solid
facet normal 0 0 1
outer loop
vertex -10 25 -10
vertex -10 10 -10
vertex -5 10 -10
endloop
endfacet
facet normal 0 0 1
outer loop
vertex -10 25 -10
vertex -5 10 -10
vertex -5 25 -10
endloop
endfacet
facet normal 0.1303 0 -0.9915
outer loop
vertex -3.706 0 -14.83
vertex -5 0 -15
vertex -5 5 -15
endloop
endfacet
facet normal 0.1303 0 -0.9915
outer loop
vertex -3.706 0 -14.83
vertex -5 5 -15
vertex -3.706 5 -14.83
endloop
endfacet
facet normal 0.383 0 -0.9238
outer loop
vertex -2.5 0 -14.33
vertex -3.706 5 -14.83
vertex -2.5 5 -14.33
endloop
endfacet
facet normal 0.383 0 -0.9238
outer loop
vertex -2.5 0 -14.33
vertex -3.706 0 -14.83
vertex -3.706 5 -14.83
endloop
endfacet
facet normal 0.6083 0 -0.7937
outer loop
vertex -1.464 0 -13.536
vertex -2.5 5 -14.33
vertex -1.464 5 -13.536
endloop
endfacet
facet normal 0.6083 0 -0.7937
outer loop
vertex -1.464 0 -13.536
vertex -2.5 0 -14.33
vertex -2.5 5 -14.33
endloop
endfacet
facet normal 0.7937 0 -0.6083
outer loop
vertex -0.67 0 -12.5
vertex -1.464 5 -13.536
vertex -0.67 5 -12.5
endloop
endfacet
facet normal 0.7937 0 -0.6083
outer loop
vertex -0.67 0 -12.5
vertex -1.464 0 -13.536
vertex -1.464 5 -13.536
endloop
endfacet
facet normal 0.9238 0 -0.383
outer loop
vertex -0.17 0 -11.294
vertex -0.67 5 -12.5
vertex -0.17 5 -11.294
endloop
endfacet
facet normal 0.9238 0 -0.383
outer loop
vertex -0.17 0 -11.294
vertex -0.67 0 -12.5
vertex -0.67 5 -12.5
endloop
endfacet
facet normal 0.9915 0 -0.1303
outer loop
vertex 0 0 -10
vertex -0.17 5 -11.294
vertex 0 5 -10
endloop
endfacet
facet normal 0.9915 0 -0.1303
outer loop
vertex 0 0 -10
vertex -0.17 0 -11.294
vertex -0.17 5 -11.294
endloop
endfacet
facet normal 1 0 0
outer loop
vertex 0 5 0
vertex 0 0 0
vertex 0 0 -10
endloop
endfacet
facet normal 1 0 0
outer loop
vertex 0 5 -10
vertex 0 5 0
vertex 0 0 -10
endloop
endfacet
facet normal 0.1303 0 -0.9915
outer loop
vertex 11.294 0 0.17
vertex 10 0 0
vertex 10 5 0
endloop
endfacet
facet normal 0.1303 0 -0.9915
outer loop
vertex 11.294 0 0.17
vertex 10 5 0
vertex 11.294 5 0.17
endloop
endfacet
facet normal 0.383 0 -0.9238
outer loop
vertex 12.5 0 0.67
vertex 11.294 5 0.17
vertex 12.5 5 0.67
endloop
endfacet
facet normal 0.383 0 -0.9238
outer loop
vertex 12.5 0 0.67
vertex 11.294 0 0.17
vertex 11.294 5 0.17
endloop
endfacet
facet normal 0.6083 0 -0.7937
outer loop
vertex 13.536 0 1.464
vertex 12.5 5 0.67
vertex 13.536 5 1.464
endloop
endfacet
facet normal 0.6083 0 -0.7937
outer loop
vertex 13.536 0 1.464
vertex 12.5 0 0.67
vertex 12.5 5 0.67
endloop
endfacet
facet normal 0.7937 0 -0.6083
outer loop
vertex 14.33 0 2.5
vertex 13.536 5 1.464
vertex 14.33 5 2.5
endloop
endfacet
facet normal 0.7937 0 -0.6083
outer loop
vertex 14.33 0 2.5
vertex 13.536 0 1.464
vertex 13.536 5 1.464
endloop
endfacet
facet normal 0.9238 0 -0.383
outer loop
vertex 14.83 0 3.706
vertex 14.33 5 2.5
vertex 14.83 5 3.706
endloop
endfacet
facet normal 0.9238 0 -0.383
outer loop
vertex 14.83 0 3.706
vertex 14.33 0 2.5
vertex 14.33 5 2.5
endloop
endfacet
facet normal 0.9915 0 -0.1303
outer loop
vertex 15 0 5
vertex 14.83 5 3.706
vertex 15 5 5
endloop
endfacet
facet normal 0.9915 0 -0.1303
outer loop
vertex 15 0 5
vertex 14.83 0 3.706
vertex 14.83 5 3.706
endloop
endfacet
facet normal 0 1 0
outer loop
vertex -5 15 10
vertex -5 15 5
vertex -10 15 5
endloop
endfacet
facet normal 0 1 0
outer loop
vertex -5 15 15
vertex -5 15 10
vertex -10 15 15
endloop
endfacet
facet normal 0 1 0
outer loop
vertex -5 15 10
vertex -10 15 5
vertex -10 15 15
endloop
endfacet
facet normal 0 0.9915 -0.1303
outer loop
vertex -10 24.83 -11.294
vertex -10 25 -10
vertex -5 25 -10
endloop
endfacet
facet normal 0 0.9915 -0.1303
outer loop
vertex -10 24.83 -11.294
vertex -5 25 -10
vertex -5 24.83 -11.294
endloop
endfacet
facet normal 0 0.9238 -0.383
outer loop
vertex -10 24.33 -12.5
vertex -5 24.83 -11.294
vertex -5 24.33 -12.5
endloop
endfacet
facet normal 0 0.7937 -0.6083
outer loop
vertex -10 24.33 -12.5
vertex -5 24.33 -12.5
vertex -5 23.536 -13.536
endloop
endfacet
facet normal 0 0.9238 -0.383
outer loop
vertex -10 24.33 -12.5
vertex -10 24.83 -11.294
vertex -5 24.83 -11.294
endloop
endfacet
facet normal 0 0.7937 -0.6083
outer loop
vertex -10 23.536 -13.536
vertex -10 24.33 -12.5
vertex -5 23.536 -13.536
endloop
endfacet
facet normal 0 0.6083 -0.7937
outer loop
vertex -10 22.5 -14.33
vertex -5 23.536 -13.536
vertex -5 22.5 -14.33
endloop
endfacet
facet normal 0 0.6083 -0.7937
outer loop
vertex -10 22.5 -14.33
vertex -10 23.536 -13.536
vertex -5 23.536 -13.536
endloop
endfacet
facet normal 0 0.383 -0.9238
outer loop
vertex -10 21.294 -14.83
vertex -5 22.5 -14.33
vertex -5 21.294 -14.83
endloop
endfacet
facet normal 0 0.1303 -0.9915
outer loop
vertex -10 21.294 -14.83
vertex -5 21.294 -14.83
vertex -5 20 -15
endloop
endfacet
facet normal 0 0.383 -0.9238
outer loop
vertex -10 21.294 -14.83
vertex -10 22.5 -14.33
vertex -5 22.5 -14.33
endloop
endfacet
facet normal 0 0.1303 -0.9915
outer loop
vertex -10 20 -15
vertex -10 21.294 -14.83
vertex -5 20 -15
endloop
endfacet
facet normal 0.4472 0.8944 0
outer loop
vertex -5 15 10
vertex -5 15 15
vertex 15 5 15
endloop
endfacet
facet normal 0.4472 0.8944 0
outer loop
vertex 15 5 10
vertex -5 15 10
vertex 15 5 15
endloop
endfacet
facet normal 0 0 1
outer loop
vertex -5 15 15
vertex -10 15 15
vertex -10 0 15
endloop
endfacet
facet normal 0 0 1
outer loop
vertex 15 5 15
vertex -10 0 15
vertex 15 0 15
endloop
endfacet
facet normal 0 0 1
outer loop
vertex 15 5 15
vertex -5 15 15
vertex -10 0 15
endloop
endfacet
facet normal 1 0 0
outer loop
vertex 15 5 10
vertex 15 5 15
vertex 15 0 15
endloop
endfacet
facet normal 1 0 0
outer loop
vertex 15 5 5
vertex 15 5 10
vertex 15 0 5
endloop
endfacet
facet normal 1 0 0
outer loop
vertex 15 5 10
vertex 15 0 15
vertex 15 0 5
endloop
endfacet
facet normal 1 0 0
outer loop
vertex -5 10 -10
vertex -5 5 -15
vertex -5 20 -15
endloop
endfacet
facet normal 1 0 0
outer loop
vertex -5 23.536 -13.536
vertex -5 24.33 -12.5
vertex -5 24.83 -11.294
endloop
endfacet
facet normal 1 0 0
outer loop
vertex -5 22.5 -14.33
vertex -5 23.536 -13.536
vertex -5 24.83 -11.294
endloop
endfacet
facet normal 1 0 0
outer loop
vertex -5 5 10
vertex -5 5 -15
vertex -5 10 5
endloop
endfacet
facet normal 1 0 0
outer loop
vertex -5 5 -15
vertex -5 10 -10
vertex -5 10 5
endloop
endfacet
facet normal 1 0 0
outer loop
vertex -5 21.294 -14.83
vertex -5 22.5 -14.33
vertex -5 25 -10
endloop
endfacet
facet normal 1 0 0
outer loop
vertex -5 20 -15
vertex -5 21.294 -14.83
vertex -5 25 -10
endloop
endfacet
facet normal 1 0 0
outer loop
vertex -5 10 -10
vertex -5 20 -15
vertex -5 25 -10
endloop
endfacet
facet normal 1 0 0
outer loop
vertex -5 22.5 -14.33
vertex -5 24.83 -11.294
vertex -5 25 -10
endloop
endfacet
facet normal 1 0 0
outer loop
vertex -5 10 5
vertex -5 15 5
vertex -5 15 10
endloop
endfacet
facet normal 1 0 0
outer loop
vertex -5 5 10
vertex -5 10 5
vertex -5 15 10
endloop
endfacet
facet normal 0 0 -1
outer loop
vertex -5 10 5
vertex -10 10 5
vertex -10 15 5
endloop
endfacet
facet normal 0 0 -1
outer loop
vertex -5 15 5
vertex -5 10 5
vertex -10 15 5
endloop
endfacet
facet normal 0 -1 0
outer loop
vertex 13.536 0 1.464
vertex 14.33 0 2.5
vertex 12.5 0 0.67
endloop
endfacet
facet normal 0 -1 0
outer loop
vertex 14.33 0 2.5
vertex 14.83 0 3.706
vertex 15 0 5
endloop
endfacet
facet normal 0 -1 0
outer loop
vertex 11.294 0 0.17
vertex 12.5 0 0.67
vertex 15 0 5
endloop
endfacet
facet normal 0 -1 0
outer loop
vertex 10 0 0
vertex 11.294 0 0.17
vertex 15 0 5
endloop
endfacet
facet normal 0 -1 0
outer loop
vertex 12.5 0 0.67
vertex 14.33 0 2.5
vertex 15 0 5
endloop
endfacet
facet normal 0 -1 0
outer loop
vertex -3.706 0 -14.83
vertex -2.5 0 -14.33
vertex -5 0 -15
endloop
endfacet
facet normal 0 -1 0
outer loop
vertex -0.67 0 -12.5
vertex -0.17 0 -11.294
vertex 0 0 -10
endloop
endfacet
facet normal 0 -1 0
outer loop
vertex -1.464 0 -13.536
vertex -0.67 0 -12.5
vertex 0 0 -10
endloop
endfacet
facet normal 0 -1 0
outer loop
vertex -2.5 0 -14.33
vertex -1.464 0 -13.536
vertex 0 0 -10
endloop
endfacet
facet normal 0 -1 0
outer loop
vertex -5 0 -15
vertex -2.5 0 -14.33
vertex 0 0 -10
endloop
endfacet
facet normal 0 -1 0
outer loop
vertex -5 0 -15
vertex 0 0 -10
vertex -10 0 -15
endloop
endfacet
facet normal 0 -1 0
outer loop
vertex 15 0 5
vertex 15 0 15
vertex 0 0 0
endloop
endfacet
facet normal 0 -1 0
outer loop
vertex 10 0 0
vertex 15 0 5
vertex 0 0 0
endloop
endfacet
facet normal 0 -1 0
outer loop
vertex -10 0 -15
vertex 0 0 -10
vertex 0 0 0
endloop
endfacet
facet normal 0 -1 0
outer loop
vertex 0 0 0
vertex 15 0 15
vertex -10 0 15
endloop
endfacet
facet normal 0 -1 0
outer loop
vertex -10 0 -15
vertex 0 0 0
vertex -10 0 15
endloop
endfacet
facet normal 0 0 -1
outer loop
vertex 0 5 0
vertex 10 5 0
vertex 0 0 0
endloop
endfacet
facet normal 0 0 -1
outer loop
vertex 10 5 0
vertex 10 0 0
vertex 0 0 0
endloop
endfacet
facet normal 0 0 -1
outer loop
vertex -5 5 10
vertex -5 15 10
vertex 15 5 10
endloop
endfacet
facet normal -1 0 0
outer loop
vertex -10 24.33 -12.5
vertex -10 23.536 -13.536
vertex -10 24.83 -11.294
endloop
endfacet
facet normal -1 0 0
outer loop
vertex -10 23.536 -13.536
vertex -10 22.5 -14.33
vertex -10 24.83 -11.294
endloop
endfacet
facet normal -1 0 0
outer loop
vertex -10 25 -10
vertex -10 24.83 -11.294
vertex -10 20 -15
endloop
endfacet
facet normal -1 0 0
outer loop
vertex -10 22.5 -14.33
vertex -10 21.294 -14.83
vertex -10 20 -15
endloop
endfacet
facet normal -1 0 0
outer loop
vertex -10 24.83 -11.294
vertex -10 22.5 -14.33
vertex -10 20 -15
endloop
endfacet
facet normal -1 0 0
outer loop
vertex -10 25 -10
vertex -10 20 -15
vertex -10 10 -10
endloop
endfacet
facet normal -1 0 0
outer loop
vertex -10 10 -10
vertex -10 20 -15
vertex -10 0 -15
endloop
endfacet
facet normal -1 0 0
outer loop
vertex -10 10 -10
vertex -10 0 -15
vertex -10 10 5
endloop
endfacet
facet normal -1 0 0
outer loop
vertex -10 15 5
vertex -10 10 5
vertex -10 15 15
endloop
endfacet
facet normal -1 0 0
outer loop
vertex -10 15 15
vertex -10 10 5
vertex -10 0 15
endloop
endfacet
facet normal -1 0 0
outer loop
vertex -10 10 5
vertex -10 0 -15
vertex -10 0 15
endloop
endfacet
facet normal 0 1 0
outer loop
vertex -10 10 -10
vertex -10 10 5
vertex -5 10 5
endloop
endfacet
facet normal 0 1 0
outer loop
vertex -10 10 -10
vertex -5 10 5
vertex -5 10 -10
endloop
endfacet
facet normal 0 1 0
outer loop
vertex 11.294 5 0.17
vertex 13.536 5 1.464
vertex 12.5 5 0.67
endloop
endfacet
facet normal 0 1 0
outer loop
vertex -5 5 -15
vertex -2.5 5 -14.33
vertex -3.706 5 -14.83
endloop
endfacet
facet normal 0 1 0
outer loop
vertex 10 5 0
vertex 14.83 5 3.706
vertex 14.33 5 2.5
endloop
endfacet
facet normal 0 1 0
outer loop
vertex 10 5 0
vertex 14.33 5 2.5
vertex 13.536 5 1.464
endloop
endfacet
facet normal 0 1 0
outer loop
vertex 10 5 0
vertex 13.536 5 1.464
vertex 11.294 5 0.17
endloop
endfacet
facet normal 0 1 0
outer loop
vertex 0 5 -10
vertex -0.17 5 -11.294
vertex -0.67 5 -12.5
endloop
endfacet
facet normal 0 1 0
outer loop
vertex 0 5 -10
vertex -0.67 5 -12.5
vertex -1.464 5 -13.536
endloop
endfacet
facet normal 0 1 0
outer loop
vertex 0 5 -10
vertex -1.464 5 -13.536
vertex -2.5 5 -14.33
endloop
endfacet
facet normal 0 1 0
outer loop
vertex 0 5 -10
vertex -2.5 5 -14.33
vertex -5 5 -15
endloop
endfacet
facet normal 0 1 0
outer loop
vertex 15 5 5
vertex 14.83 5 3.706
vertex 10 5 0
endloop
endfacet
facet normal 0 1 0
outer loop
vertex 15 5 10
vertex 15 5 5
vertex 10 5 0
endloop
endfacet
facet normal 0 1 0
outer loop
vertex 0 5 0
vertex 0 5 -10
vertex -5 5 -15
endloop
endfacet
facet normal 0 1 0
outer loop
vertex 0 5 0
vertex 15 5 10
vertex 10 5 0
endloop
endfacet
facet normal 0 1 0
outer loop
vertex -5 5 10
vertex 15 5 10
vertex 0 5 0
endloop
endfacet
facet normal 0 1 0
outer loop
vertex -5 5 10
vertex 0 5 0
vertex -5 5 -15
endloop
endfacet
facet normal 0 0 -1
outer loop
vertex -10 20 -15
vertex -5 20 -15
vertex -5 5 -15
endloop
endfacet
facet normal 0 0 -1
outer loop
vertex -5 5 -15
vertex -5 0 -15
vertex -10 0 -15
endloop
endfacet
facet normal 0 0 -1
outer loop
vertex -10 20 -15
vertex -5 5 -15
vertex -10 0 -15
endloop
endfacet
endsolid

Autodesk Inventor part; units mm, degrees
ref_plane "YZ Plane" through (0, 0, 0) normal (1, 0, 0) x (0, 1, 0)
ref_plane "XZ Plane" through (0, 0, 0) normal (0, 1, 0) x (-1, 0, 0)
ref_plane "XY Plane" through (0, 0, 0) normal (0, 0, 1) x (1, 0, 0)
sketch "草圖1" plane through (0, 0, 0) normal (0, 1, 0) x (-1, 0, 0)
  line L0 (10, 15) -> (-15, 15)
  line L1 (-15, 15) -> (-15, 5)
  line L2 (-10, 0) -> (0, 0)
  line L3 (10, 0) -> (10, 15)
  line L4 (10, 15) -> (0, 15)
  line L5 (0, 0) -> (0, -10)
  line L6 (5, -15) -> (10, -15)
  line L7 (10, -15) -> (10, 15)
  arc A0 (0, -10) -> (5, -15) centre (5, -10) ccw
  arc A1 (-15, 5) -> (-10, 0) centre (-10, 5) ccw
  point P0 (-15, 0)
  point P1 (0, -15)
  dimension "d0" = 15
  dimension "d1" = 10
  dimension "d2" = 30
  dimension "d3" = 25
  dimension "d4" = 5
extrude "擠出1" add sketch "草圖1" along normal blind 5
sketch "草圖2" plane through (-10, 0, -15) normal (-1, 0, 0) x (0, 0, 1)
  line L0 (30, 0) -> (20, 0) construction
  line L1 (20, 0) -> (20, 5) construction
  line L2 (30, 5) -> (20, 5) construction
  line L3 (30, 0) -> (30, 5) construction
  line L4 (20, 0) -> (15, 0) construction
  line L5 (15, 0) -> (15, 5) construction
  line L6 (20, 5) -> (15, 5) construction
  line L7 (20, 0) -> (20, 5) construction
  line L8 (15, 0) -> (5, 0) construction
  line L9 (5, 0) -> (5, 5) construction
  line L10 (15, 5) -> (5, 5) construction
  line L11 (15, 0) -> (15, 5) construction
  line L12 (5, 0) -> (0, 0) construction
  line L13 (0, 0) -> (0, 5) construction
  line L14 (5, 5) -> (0, 5) construction
  line L15 (5, 0) -> (5, 5) construction
  line L16 (30, 0) -> (30, 5) projected
  line L17 (30, 5) -> (20, 5)
  line L18 (20, 10) -> (20, 15)
  line L19 (20, 15) -> (30, 15)
  line L20 (30, 15) -> (30, 5)
  line L21 (15, 5) -> (5, 5) projected
  line L22 (20, 10) -> (5, 10)
  line L23 (5, 5) -> (20, 5)
  line L24 (0, 5) -> (30, 5) projected
  line L25 (0, 5) -> (5, 5)
  line L26 (5, 10) -> (5, 25)
  line L27 (5, 25) -> (5, 25)
  line L28 (0, 20) -> (0, 5)
  arc A0 (5, 25) -> (0, 20) centre (5, 20) ccw
  point P0 (0, 25)
  dimension "d7" = 5
  dimension "d8" = 10
  dimension "d9" = 10
  dimension "d10" = 5
  dimension "d11" = 20
  dimension "d12" = 5
extrude "擠出2" add sketch "草圖2" against normal blind 5
sketch "草圖3" plane through (-10, 0, 15) normal (0, 0, 1) x (1, 0, 0)
  line L0 (0, 0) -> (25, 0) construction
  line L1 (25, 0) -> (25, 5) construction
  line L2 (5, 5) -> (25, 5) construction
  line L3 (5, 15) -> (5, 5) construction
  line L4 (0, 15) -> (5, 15) construction
  line L5 (0, 0) -> (0, 15) construction
  line L6 (5, 5) -> (25, 5) projected
  line L7 (5, 15) -> (25, 5)
  line L8 (25, 5) -> (5, 5)
  line L9 (5, 5) -> (5, 15)
  point P0 (10, 0)
extrude "擠出3" add sketch "草圖3" against normal blind 5
properties part number "5"
